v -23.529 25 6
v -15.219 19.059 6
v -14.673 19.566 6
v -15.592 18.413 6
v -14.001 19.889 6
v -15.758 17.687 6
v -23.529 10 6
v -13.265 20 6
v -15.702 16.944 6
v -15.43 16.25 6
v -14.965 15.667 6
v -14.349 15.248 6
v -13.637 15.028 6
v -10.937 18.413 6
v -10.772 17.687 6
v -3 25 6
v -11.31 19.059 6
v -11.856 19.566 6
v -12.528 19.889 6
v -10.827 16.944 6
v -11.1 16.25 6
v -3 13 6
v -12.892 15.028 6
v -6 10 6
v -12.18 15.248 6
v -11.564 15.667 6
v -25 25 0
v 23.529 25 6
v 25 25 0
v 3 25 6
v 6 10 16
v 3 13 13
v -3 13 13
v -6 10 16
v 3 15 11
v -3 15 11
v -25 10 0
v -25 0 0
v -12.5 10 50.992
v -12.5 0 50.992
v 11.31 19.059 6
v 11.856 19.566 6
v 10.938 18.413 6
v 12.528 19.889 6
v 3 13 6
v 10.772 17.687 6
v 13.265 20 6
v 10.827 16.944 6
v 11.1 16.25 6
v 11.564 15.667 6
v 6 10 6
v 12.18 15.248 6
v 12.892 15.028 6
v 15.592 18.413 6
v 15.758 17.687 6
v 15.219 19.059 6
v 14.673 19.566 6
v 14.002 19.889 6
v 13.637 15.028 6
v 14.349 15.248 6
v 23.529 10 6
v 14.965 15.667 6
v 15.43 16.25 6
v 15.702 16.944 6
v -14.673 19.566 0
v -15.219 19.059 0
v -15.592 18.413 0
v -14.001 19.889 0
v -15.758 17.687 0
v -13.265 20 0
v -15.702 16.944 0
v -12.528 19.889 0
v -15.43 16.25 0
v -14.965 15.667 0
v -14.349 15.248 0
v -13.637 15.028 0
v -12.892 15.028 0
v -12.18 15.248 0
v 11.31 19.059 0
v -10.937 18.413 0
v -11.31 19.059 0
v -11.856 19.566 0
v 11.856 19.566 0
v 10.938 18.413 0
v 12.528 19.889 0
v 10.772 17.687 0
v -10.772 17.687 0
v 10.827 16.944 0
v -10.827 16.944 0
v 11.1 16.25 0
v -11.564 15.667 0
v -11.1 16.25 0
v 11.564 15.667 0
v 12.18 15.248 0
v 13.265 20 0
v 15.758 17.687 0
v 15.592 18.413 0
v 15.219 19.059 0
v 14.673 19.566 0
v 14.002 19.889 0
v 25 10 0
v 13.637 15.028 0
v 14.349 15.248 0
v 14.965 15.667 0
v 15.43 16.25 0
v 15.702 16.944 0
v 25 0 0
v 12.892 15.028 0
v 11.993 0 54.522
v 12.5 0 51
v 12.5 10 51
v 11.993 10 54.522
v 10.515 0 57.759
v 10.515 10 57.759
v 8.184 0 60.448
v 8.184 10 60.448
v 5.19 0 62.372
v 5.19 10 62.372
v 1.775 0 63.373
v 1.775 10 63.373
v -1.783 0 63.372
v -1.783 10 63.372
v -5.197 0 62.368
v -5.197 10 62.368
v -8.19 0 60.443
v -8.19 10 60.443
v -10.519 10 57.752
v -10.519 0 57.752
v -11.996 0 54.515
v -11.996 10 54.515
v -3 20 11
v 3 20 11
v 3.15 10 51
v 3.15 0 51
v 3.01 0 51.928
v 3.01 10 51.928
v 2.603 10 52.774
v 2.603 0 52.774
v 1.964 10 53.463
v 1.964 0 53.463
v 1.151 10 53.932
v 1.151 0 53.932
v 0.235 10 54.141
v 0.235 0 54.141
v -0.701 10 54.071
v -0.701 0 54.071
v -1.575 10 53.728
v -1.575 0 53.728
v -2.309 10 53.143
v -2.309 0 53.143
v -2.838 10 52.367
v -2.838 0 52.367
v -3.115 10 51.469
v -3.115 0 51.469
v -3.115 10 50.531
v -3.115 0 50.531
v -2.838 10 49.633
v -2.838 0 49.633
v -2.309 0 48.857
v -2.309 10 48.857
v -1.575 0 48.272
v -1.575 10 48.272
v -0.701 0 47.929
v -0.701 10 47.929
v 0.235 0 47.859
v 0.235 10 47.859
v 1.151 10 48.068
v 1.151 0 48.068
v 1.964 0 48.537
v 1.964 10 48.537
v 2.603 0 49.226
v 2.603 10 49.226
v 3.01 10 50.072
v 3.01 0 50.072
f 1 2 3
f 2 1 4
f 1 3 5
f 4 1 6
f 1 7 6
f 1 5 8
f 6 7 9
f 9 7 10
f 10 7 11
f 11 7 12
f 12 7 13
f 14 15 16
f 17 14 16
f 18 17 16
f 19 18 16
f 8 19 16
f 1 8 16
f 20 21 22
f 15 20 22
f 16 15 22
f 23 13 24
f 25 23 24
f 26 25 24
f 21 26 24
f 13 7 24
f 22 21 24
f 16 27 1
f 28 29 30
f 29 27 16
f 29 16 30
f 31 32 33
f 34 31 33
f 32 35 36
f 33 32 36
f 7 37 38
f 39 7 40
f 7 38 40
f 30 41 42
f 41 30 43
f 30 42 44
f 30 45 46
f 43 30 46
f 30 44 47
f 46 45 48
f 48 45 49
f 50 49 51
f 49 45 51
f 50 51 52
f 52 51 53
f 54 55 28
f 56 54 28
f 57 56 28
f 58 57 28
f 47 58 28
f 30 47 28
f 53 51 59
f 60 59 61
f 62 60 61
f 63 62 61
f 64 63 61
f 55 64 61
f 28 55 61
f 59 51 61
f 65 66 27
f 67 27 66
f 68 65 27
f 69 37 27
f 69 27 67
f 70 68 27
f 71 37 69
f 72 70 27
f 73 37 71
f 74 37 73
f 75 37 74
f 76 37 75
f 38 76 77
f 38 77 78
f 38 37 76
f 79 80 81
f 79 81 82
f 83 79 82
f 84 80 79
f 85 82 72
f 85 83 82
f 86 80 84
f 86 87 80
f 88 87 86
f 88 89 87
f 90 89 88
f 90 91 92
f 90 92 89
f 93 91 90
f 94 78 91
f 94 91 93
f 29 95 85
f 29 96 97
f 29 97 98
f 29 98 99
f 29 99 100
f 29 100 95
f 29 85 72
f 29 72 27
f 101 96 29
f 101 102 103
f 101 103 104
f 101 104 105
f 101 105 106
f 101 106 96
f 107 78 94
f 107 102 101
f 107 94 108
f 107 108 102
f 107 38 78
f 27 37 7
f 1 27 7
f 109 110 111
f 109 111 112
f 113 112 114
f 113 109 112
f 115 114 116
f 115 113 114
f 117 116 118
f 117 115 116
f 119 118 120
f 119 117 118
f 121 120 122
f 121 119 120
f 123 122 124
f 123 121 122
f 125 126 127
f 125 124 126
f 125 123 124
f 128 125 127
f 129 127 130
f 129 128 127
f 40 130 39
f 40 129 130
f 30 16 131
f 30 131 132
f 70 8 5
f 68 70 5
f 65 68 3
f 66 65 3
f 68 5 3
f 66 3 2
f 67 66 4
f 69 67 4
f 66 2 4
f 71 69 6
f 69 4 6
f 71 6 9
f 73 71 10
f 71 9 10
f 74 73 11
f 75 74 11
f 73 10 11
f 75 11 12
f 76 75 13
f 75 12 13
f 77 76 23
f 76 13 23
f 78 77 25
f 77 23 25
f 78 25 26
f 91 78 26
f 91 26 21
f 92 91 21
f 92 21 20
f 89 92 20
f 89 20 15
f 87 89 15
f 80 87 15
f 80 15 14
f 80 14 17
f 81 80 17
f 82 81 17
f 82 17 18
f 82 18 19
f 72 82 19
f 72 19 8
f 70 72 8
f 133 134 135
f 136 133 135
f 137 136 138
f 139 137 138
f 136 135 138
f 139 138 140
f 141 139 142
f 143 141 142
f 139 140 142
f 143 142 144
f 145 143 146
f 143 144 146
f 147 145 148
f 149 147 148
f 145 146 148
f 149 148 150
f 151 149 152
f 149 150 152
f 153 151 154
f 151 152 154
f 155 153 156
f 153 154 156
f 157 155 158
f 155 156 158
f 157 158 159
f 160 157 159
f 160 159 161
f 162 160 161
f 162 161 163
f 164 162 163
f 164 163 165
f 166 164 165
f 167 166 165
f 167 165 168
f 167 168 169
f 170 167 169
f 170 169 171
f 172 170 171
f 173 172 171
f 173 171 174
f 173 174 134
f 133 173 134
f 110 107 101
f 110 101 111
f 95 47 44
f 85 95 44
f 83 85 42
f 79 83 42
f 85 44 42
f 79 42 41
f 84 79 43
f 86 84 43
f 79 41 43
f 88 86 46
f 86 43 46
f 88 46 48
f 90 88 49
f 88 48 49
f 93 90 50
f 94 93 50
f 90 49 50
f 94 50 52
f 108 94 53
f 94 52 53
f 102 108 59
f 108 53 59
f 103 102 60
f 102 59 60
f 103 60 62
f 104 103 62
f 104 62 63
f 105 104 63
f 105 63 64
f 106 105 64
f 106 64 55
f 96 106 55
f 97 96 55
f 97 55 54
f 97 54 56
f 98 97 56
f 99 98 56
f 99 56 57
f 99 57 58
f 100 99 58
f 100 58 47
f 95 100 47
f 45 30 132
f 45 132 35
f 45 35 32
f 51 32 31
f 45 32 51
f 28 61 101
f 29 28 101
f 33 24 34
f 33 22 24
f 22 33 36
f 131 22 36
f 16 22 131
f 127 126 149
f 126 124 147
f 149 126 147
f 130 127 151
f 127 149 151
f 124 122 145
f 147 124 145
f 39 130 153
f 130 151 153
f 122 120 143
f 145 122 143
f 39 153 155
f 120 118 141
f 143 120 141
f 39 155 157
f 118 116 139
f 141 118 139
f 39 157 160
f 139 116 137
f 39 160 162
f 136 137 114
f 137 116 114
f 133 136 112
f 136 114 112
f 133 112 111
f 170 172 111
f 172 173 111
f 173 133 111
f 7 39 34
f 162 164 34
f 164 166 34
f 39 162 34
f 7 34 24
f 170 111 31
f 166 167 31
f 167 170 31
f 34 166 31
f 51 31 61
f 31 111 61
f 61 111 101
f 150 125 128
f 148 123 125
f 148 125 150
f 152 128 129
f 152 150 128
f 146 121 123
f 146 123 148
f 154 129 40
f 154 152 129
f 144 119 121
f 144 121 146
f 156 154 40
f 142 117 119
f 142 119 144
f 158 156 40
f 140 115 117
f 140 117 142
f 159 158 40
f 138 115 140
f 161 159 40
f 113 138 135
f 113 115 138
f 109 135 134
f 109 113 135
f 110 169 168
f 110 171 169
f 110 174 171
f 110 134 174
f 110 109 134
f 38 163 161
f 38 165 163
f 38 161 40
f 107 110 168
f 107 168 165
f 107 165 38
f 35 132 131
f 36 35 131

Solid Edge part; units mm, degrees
sketch "Sketch1" plane through (0, 0, 0) normal (0, -1, 0) x (1, 0, 0)
  circle A0 centre (0, 51) radius 3.15
  line L0 (25, 0) -> (12.5, 51)
  line L1 (0, 0) -> (25, 0)
  line L2 (0, 0) -> (-25, 0)
  line L3 (-25, 0) -> (-12.5, 50.9918)
  arc A1 (-12.5, 50.9918) -> (12.5, 51) centre (0, 51) cw
extrude "Protrusion1" add sketch "Sketch1" against normal blind 10
sketch "Sketch2" plane through (0, 10, 31.75) normal (0, 1, 0) x (-1, 0, 0)
  line L0 (23.5292, -25.75) -> (-23.5294, -25.75)
  line L1 (-23.5294, -25.75) -> (-25, -31.75)
  line L2 (-25, -31.75) -> (25, -31.75)
  line L3 (25, -31.75) -> (23.5292, -25.75)
extrude "ExtrudedProtrusion_5" add sketch "Sketch2" along normal blind 15
sketch "Sketch3" plane through (0.0001, 17.5, 6) normal (0, 0, 1) x (-1, 0, 0)
  line L0 (3.0001, 7.5) -> (3.0001, -7.5)
  line L1 (3.0001, -7.5) -> (-2.9999, -7.5)
  line L2 (-2.9999, -7.5) -> (-2.9999, 7.5)
  line L3 (-2.9999, 7.5) -> (3.0001, 7.5)
extrude "ExtrudedProtrusion_6" add sketch "Sketch3" along normal blind 5
chamfer "Chamfer_4" distance 5 angle 45 2 edges at (0, 10, 11) (0, 25, 11)
chamfer "Chamfer_5" distance 3 angle 45 2 edges at (3, 10, 11) (-3, 10, 11)
sketch "Sketch4" plane through (13.2647, 17.5, 6) normal (0, 0, 1) x (0, 1, 0)
  circle A0 centre (0, 0) radius 2.5
  circle A1 centre (0, 26.5293) radius 2.5
  dimension "D1" = 5
  dimension "D2" = 5
extrude "Cutout1" cut sketch "Sketch4" against normal up to next
